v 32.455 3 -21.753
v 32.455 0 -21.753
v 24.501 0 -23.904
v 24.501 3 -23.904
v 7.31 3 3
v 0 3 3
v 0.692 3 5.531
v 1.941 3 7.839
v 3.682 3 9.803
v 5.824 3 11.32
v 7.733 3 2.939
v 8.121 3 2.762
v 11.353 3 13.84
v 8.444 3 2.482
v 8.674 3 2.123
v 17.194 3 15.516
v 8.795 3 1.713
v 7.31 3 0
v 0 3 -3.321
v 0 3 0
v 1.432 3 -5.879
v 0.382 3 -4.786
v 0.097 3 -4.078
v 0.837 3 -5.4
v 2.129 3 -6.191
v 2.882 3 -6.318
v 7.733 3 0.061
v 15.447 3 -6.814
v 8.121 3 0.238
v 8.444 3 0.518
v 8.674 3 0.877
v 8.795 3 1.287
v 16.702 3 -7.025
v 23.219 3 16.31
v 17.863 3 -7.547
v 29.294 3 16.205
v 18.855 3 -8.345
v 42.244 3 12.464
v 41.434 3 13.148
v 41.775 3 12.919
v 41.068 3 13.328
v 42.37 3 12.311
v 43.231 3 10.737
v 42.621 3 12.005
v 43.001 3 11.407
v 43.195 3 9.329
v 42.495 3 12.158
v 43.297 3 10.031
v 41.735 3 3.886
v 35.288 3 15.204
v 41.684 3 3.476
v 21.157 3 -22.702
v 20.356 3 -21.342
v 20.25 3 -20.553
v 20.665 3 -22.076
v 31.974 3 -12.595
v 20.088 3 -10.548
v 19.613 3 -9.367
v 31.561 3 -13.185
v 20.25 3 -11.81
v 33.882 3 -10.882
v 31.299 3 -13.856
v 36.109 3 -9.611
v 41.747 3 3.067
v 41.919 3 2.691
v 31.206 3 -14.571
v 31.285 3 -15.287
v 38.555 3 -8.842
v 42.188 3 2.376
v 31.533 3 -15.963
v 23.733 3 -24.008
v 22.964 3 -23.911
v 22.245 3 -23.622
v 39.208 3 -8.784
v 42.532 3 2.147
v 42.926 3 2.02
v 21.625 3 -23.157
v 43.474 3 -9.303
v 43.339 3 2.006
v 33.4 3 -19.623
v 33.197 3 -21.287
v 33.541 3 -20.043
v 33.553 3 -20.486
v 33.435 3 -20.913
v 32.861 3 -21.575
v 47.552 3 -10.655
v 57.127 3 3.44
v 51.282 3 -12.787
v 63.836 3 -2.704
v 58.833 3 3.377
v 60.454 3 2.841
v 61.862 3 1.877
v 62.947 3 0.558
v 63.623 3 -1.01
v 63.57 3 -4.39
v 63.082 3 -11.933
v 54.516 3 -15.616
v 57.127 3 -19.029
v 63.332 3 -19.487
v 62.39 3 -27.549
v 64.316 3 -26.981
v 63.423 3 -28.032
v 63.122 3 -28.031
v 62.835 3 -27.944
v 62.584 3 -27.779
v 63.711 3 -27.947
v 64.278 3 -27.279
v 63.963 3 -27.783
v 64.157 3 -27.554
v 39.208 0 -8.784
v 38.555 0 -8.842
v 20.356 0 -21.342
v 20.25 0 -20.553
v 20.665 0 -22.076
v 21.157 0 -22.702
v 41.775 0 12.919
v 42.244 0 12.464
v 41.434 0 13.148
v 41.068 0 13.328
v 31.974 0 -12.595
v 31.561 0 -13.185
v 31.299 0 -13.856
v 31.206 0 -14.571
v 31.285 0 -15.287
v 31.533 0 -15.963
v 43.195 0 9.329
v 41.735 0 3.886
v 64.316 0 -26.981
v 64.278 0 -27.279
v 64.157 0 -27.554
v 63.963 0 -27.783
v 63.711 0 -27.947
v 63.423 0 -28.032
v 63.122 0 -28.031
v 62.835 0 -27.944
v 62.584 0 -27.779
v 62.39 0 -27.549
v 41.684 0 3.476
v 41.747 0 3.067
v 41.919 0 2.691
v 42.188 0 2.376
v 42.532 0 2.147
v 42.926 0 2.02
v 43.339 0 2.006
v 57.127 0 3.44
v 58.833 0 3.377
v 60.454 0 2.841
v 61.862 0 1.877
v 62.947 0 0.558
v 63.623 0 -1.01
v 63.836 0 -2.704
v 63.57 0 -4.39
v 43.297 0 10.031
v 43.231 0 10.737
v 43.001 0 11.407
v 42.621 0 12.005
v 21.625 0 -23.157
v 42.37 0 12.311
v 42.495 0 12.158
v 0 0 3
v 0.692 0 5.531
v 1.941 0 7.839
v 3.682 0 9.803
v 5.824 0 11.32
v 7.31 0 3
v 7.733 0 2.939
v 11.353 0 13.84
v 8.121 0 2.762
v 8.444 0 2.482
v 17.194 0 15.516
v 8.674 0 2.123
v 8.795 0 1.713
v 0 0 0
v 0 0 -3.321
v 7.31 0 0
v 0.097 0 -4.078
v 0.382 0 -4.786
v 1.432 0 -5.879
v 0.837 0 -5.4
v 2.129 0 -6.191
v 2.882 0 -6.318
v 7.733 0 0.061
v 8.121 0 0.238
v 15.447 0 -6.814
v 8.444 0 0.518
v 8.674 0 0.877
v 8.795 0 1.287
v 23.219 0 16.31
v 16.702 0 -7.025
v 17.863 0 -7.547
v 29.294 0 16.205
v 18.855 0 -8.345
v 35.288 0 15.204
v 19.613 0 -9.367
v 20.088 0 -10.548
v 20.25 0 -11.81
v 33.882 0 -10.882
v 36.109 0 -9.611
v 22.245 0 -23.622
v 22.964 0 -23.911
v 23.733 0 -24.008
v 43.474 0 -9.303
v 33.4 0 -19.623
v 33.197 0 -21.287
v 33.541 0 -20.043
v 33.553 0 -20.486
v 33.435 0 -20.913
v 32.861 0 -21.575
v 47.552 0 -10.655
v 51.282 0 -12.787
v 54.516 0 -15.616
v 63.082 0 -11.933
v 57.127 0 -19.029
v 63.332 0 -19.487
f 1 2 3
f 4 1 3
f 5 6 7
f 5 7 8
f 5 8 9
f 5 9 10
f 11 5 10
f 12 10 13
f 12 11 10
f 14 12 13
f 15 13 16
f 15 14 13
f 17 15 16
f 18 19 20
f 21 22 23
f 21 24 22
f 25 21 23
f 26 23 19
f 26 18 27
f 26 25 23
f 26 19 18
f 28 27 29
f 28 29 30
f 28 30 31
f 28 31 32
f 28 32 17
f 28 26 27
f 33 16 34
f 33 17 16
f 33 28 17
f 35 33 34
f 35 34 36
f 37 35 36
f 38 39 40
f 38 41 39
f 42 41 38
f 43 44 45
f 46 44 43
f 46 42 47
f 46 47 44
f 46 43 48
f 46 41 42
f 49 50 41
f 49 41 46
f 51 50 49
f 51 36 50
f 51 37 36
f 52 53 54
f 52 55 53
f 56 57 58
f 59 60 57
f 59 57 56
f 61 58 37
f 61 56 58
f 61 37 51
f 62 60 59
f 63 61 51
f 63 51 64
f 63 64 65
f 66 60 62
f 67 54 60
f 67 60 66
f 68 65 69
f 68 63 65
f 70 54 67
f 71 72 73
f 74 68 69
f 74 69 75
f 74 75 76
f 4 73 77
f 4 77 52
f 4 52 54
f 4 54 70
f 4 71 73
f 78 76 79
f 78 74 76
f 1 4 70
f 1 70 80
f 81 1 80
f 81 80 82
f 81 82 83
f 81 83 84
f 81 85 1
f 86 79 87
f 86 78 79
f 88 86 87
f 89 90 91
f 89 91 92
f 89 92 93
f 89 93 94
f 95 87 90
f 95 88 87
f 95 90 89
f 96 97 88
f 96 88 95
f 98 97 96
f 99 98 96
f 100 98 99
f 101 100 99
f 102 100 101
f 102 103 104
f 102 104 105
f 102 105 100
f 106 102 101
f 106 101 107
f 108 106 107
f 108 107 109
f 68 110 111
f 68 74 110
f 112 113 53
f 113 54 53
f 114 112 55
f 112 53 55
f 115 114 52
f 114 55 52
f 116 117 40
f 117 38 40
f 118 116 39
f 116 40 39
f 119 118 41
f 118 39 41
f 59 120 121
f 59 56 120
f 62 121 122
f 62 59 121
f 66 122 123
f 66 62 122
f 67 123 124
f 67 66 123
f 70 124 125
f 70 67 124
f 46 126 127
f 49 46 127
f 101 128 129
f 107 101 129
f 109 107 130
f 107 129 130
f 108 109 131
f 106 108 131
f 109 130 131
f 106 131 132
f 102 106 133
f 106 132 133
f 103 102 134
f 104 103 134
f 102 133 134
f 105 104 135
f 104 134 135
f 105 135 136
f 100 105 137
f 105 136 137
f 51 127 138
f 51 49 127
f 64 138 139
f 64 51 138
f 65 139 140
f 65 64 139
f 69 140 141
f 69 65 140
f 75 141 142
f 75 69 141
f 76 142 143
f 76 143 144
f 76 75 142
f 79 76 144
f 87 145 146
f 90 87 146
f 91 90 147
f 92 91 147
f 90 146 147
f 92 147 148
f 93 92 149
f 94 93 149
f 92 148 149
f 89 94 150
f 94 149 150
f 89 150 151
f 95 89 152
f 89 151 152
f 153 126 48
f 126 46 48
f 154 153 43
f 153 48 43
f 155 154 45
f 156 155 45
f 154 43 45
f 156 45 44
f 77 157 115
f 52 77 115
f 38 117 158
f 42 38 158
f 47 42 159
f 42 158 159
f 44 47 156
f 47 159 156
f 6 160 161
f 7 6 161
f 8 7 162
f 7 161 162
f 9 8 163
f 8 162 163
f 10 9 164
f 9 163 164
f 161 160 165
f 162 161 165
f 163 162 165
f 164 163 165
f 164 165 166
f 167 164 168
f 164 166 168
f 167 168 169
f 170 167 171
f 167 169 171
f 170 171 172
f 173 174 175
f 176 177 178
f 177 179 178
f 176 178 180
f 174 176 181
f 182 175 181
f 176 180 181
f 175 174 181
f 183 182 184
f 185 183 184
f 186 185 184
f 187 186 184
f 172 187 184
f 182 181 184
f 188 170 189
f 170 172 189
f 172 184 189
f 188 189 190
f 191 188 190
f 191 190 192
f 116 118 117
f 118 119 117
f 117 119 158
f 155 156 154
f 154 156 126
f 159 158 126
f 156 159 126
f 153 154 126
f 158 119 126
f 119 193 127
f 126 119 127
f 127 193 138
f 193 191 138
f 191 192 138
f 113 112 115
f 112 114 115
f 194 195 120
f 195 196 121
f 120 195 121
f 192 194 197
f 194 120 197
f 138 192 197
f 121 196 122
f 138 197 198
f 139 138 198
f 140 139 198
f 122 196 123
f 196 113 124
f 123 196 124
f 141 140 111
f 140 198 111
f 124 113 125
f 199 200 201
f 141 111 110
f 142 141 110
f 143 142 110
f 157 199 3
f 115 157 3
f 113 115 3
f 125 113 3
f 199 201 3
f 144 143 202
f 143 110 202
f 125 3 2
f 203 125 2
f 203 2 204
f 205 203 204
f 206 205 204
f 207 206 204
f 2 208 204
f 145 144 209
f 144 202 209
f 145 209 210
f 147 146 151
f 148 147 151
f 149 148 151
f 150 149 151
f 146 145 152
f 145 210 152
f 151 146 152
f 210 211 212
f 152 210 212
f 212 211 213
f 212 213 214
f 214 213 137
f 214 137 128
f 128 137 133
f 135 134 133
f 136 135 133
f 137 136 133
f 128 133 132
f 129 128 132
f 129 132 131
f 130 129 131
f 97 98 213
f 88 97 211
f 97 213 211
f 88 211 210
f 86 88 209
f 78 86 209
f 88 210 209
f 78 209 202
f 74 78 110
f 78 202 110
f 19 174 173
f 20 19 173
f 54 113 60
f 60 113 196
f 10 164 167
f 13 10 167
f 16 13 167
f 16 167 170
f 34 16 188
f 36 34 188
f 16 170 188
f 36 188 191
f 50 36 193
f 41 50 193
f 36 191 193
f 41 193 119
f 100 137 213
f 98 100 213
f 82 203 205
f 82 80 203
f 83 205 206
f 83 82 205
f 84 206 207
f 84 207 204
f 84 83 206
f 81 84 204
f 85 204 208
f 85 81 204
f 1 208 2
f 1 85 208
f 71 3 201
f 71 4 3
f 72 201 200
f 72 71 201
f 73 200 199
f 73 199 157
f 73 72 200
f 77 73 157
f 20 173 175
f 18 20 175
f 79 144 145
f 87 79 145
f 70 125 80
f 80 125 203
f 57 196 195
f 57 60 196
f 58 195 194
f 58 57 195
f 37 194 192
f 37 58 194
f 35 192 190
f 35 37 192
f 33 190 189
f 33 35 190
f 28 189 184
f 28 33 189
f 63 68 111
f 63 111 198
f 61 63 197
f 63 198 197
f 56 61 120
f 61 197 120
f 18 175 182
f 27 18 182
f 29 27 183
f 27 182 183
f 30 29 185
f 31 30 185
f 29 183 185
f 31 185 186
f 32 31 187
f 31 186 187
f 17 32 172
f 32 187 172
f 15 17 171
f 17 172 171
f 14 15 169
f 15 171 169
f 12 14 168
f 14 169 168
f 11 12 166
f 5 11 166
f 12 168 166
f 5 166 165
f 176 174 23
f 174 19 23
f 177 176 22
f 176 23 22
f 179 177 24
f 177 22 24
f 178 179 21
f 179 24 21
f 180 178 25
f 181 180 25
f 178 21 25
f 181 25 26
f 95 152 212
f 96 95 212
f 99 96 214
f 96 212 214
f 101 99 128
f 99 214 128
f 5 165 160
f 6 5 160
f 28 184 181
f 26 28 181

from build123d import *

# Parameters (mm, degrees)
BOSS_EXTRUDE1_DEPTH = 3
FILLET1_R           = 1.5
FILLET2_R           = 3
FILLET3_R           = 1.5
FILLET4_R           = 5


with BuildPart() as part:
    # Sketch1 → Boss-Extrude1 (new body)
    with BuildSketch(Plane(origin=(0, 0, 0), x_dir=(1, 0, 0), z_dir=(0, 1, 0))):
        with BuildLine():
            Line((0, 0), (7.31, 0))
            ThreePointArc((7.31, 0), (8.81, -1.5), (7.31, -3))
            Line((7.31, -3), (0, -3))
            ThreePointArc((0, -3), (1.941416089, -7.839258354), (5.823510613, -11.320186386))
            ThreePointArc((5.823510613, -11.320186386), (23.597809929, -16.33), (41.768131919, -13.034040752))
            ThreePointArc((41.768131919, -13.034040752), (42.687342923, -11.923770269), (43.59, -10.8))
            Line((43.59, -10.8), (41.17, -1.78))
            Line((41.17, -1.78), (57.126632367, -3.44))
            ThreePointArc((57.126632367, -3.44), (62.451393238, -1.255638394), (63.57, 4.39))
            ThreePointArc((63.57, 4.39), (63.114921372, 15.71270599), (64.31568295, 26.980755472))
            ThreePointArc((64.31568295, 26.980755472), (63.57, 28), (62.39039615, 27.548959839))
            Line((62.39039615, 27.548959839), (57.126632367, 19.028512497))
            ThreePointArc((57.126632367, 19.028512497), (49.331544712, 11.549647985), (38.89, 8.78))
            ThreePointArc((38.89, 8.78), (34.195061115, 10.662812141), (30.69, 14.31))
            Line((30.69, 14.31), (34.24, 21.27))
            Line((34.24, 21.27), (22.85, 24.35))
            Line((22.85, 24.35), (20.25, 21.818890812))
            Line((20.25, 21.818890812), (20.25, 7.003260248))
            Line((20.25, 7.003260248), (0, 6.204789211))
            Line((0, 6.204789211), (0, 0))
        make_face()
    extrude(amount=BOSS_EXTRUDE1_DEPTH)

    # Fillet1
    fillet1_edges = [part.edges().sort_by_distance(p)[0] for p in [
        (41.17, 1.5, 1.78),
    ]]
    fillet(fillet1_edges, radius=FILLET1_R)

    # Fillet2
    fillet2_edges = [part.edges().sort_by_distance(p)[0] for p in [
        (22.85, 1.5, -24.35),
        (30.69, 1.5, -14.31),
        (38.89, 1.5, -8.78),
        (43.59, 1.5, 10.8),
        (41.768131919, 1.5, 13.034040752),
        (0, 1.5, -6.204789211),
        (20.25, 1.5, -21.818890812),
    ]]
    fillet(fillet2_edges, radius=FILLET2_R)

    # Fillet3
    fillet3_edges = [part.edges().sort_by_distance(p)[0] for p in [
        (34.24, 1.5, -21.27),
    ]]
    fillet(fillet3_edges, radius=FILLET3_R)

    # Fillet4
    fillet4_edges = [part.edges().sort_by_distance(p)[0] for p in [
        (20.25, 1.5, -7.003260248),
    ]]
    fillet(fillet4_edges, radius=FILLET4_R)


solid = part.part
